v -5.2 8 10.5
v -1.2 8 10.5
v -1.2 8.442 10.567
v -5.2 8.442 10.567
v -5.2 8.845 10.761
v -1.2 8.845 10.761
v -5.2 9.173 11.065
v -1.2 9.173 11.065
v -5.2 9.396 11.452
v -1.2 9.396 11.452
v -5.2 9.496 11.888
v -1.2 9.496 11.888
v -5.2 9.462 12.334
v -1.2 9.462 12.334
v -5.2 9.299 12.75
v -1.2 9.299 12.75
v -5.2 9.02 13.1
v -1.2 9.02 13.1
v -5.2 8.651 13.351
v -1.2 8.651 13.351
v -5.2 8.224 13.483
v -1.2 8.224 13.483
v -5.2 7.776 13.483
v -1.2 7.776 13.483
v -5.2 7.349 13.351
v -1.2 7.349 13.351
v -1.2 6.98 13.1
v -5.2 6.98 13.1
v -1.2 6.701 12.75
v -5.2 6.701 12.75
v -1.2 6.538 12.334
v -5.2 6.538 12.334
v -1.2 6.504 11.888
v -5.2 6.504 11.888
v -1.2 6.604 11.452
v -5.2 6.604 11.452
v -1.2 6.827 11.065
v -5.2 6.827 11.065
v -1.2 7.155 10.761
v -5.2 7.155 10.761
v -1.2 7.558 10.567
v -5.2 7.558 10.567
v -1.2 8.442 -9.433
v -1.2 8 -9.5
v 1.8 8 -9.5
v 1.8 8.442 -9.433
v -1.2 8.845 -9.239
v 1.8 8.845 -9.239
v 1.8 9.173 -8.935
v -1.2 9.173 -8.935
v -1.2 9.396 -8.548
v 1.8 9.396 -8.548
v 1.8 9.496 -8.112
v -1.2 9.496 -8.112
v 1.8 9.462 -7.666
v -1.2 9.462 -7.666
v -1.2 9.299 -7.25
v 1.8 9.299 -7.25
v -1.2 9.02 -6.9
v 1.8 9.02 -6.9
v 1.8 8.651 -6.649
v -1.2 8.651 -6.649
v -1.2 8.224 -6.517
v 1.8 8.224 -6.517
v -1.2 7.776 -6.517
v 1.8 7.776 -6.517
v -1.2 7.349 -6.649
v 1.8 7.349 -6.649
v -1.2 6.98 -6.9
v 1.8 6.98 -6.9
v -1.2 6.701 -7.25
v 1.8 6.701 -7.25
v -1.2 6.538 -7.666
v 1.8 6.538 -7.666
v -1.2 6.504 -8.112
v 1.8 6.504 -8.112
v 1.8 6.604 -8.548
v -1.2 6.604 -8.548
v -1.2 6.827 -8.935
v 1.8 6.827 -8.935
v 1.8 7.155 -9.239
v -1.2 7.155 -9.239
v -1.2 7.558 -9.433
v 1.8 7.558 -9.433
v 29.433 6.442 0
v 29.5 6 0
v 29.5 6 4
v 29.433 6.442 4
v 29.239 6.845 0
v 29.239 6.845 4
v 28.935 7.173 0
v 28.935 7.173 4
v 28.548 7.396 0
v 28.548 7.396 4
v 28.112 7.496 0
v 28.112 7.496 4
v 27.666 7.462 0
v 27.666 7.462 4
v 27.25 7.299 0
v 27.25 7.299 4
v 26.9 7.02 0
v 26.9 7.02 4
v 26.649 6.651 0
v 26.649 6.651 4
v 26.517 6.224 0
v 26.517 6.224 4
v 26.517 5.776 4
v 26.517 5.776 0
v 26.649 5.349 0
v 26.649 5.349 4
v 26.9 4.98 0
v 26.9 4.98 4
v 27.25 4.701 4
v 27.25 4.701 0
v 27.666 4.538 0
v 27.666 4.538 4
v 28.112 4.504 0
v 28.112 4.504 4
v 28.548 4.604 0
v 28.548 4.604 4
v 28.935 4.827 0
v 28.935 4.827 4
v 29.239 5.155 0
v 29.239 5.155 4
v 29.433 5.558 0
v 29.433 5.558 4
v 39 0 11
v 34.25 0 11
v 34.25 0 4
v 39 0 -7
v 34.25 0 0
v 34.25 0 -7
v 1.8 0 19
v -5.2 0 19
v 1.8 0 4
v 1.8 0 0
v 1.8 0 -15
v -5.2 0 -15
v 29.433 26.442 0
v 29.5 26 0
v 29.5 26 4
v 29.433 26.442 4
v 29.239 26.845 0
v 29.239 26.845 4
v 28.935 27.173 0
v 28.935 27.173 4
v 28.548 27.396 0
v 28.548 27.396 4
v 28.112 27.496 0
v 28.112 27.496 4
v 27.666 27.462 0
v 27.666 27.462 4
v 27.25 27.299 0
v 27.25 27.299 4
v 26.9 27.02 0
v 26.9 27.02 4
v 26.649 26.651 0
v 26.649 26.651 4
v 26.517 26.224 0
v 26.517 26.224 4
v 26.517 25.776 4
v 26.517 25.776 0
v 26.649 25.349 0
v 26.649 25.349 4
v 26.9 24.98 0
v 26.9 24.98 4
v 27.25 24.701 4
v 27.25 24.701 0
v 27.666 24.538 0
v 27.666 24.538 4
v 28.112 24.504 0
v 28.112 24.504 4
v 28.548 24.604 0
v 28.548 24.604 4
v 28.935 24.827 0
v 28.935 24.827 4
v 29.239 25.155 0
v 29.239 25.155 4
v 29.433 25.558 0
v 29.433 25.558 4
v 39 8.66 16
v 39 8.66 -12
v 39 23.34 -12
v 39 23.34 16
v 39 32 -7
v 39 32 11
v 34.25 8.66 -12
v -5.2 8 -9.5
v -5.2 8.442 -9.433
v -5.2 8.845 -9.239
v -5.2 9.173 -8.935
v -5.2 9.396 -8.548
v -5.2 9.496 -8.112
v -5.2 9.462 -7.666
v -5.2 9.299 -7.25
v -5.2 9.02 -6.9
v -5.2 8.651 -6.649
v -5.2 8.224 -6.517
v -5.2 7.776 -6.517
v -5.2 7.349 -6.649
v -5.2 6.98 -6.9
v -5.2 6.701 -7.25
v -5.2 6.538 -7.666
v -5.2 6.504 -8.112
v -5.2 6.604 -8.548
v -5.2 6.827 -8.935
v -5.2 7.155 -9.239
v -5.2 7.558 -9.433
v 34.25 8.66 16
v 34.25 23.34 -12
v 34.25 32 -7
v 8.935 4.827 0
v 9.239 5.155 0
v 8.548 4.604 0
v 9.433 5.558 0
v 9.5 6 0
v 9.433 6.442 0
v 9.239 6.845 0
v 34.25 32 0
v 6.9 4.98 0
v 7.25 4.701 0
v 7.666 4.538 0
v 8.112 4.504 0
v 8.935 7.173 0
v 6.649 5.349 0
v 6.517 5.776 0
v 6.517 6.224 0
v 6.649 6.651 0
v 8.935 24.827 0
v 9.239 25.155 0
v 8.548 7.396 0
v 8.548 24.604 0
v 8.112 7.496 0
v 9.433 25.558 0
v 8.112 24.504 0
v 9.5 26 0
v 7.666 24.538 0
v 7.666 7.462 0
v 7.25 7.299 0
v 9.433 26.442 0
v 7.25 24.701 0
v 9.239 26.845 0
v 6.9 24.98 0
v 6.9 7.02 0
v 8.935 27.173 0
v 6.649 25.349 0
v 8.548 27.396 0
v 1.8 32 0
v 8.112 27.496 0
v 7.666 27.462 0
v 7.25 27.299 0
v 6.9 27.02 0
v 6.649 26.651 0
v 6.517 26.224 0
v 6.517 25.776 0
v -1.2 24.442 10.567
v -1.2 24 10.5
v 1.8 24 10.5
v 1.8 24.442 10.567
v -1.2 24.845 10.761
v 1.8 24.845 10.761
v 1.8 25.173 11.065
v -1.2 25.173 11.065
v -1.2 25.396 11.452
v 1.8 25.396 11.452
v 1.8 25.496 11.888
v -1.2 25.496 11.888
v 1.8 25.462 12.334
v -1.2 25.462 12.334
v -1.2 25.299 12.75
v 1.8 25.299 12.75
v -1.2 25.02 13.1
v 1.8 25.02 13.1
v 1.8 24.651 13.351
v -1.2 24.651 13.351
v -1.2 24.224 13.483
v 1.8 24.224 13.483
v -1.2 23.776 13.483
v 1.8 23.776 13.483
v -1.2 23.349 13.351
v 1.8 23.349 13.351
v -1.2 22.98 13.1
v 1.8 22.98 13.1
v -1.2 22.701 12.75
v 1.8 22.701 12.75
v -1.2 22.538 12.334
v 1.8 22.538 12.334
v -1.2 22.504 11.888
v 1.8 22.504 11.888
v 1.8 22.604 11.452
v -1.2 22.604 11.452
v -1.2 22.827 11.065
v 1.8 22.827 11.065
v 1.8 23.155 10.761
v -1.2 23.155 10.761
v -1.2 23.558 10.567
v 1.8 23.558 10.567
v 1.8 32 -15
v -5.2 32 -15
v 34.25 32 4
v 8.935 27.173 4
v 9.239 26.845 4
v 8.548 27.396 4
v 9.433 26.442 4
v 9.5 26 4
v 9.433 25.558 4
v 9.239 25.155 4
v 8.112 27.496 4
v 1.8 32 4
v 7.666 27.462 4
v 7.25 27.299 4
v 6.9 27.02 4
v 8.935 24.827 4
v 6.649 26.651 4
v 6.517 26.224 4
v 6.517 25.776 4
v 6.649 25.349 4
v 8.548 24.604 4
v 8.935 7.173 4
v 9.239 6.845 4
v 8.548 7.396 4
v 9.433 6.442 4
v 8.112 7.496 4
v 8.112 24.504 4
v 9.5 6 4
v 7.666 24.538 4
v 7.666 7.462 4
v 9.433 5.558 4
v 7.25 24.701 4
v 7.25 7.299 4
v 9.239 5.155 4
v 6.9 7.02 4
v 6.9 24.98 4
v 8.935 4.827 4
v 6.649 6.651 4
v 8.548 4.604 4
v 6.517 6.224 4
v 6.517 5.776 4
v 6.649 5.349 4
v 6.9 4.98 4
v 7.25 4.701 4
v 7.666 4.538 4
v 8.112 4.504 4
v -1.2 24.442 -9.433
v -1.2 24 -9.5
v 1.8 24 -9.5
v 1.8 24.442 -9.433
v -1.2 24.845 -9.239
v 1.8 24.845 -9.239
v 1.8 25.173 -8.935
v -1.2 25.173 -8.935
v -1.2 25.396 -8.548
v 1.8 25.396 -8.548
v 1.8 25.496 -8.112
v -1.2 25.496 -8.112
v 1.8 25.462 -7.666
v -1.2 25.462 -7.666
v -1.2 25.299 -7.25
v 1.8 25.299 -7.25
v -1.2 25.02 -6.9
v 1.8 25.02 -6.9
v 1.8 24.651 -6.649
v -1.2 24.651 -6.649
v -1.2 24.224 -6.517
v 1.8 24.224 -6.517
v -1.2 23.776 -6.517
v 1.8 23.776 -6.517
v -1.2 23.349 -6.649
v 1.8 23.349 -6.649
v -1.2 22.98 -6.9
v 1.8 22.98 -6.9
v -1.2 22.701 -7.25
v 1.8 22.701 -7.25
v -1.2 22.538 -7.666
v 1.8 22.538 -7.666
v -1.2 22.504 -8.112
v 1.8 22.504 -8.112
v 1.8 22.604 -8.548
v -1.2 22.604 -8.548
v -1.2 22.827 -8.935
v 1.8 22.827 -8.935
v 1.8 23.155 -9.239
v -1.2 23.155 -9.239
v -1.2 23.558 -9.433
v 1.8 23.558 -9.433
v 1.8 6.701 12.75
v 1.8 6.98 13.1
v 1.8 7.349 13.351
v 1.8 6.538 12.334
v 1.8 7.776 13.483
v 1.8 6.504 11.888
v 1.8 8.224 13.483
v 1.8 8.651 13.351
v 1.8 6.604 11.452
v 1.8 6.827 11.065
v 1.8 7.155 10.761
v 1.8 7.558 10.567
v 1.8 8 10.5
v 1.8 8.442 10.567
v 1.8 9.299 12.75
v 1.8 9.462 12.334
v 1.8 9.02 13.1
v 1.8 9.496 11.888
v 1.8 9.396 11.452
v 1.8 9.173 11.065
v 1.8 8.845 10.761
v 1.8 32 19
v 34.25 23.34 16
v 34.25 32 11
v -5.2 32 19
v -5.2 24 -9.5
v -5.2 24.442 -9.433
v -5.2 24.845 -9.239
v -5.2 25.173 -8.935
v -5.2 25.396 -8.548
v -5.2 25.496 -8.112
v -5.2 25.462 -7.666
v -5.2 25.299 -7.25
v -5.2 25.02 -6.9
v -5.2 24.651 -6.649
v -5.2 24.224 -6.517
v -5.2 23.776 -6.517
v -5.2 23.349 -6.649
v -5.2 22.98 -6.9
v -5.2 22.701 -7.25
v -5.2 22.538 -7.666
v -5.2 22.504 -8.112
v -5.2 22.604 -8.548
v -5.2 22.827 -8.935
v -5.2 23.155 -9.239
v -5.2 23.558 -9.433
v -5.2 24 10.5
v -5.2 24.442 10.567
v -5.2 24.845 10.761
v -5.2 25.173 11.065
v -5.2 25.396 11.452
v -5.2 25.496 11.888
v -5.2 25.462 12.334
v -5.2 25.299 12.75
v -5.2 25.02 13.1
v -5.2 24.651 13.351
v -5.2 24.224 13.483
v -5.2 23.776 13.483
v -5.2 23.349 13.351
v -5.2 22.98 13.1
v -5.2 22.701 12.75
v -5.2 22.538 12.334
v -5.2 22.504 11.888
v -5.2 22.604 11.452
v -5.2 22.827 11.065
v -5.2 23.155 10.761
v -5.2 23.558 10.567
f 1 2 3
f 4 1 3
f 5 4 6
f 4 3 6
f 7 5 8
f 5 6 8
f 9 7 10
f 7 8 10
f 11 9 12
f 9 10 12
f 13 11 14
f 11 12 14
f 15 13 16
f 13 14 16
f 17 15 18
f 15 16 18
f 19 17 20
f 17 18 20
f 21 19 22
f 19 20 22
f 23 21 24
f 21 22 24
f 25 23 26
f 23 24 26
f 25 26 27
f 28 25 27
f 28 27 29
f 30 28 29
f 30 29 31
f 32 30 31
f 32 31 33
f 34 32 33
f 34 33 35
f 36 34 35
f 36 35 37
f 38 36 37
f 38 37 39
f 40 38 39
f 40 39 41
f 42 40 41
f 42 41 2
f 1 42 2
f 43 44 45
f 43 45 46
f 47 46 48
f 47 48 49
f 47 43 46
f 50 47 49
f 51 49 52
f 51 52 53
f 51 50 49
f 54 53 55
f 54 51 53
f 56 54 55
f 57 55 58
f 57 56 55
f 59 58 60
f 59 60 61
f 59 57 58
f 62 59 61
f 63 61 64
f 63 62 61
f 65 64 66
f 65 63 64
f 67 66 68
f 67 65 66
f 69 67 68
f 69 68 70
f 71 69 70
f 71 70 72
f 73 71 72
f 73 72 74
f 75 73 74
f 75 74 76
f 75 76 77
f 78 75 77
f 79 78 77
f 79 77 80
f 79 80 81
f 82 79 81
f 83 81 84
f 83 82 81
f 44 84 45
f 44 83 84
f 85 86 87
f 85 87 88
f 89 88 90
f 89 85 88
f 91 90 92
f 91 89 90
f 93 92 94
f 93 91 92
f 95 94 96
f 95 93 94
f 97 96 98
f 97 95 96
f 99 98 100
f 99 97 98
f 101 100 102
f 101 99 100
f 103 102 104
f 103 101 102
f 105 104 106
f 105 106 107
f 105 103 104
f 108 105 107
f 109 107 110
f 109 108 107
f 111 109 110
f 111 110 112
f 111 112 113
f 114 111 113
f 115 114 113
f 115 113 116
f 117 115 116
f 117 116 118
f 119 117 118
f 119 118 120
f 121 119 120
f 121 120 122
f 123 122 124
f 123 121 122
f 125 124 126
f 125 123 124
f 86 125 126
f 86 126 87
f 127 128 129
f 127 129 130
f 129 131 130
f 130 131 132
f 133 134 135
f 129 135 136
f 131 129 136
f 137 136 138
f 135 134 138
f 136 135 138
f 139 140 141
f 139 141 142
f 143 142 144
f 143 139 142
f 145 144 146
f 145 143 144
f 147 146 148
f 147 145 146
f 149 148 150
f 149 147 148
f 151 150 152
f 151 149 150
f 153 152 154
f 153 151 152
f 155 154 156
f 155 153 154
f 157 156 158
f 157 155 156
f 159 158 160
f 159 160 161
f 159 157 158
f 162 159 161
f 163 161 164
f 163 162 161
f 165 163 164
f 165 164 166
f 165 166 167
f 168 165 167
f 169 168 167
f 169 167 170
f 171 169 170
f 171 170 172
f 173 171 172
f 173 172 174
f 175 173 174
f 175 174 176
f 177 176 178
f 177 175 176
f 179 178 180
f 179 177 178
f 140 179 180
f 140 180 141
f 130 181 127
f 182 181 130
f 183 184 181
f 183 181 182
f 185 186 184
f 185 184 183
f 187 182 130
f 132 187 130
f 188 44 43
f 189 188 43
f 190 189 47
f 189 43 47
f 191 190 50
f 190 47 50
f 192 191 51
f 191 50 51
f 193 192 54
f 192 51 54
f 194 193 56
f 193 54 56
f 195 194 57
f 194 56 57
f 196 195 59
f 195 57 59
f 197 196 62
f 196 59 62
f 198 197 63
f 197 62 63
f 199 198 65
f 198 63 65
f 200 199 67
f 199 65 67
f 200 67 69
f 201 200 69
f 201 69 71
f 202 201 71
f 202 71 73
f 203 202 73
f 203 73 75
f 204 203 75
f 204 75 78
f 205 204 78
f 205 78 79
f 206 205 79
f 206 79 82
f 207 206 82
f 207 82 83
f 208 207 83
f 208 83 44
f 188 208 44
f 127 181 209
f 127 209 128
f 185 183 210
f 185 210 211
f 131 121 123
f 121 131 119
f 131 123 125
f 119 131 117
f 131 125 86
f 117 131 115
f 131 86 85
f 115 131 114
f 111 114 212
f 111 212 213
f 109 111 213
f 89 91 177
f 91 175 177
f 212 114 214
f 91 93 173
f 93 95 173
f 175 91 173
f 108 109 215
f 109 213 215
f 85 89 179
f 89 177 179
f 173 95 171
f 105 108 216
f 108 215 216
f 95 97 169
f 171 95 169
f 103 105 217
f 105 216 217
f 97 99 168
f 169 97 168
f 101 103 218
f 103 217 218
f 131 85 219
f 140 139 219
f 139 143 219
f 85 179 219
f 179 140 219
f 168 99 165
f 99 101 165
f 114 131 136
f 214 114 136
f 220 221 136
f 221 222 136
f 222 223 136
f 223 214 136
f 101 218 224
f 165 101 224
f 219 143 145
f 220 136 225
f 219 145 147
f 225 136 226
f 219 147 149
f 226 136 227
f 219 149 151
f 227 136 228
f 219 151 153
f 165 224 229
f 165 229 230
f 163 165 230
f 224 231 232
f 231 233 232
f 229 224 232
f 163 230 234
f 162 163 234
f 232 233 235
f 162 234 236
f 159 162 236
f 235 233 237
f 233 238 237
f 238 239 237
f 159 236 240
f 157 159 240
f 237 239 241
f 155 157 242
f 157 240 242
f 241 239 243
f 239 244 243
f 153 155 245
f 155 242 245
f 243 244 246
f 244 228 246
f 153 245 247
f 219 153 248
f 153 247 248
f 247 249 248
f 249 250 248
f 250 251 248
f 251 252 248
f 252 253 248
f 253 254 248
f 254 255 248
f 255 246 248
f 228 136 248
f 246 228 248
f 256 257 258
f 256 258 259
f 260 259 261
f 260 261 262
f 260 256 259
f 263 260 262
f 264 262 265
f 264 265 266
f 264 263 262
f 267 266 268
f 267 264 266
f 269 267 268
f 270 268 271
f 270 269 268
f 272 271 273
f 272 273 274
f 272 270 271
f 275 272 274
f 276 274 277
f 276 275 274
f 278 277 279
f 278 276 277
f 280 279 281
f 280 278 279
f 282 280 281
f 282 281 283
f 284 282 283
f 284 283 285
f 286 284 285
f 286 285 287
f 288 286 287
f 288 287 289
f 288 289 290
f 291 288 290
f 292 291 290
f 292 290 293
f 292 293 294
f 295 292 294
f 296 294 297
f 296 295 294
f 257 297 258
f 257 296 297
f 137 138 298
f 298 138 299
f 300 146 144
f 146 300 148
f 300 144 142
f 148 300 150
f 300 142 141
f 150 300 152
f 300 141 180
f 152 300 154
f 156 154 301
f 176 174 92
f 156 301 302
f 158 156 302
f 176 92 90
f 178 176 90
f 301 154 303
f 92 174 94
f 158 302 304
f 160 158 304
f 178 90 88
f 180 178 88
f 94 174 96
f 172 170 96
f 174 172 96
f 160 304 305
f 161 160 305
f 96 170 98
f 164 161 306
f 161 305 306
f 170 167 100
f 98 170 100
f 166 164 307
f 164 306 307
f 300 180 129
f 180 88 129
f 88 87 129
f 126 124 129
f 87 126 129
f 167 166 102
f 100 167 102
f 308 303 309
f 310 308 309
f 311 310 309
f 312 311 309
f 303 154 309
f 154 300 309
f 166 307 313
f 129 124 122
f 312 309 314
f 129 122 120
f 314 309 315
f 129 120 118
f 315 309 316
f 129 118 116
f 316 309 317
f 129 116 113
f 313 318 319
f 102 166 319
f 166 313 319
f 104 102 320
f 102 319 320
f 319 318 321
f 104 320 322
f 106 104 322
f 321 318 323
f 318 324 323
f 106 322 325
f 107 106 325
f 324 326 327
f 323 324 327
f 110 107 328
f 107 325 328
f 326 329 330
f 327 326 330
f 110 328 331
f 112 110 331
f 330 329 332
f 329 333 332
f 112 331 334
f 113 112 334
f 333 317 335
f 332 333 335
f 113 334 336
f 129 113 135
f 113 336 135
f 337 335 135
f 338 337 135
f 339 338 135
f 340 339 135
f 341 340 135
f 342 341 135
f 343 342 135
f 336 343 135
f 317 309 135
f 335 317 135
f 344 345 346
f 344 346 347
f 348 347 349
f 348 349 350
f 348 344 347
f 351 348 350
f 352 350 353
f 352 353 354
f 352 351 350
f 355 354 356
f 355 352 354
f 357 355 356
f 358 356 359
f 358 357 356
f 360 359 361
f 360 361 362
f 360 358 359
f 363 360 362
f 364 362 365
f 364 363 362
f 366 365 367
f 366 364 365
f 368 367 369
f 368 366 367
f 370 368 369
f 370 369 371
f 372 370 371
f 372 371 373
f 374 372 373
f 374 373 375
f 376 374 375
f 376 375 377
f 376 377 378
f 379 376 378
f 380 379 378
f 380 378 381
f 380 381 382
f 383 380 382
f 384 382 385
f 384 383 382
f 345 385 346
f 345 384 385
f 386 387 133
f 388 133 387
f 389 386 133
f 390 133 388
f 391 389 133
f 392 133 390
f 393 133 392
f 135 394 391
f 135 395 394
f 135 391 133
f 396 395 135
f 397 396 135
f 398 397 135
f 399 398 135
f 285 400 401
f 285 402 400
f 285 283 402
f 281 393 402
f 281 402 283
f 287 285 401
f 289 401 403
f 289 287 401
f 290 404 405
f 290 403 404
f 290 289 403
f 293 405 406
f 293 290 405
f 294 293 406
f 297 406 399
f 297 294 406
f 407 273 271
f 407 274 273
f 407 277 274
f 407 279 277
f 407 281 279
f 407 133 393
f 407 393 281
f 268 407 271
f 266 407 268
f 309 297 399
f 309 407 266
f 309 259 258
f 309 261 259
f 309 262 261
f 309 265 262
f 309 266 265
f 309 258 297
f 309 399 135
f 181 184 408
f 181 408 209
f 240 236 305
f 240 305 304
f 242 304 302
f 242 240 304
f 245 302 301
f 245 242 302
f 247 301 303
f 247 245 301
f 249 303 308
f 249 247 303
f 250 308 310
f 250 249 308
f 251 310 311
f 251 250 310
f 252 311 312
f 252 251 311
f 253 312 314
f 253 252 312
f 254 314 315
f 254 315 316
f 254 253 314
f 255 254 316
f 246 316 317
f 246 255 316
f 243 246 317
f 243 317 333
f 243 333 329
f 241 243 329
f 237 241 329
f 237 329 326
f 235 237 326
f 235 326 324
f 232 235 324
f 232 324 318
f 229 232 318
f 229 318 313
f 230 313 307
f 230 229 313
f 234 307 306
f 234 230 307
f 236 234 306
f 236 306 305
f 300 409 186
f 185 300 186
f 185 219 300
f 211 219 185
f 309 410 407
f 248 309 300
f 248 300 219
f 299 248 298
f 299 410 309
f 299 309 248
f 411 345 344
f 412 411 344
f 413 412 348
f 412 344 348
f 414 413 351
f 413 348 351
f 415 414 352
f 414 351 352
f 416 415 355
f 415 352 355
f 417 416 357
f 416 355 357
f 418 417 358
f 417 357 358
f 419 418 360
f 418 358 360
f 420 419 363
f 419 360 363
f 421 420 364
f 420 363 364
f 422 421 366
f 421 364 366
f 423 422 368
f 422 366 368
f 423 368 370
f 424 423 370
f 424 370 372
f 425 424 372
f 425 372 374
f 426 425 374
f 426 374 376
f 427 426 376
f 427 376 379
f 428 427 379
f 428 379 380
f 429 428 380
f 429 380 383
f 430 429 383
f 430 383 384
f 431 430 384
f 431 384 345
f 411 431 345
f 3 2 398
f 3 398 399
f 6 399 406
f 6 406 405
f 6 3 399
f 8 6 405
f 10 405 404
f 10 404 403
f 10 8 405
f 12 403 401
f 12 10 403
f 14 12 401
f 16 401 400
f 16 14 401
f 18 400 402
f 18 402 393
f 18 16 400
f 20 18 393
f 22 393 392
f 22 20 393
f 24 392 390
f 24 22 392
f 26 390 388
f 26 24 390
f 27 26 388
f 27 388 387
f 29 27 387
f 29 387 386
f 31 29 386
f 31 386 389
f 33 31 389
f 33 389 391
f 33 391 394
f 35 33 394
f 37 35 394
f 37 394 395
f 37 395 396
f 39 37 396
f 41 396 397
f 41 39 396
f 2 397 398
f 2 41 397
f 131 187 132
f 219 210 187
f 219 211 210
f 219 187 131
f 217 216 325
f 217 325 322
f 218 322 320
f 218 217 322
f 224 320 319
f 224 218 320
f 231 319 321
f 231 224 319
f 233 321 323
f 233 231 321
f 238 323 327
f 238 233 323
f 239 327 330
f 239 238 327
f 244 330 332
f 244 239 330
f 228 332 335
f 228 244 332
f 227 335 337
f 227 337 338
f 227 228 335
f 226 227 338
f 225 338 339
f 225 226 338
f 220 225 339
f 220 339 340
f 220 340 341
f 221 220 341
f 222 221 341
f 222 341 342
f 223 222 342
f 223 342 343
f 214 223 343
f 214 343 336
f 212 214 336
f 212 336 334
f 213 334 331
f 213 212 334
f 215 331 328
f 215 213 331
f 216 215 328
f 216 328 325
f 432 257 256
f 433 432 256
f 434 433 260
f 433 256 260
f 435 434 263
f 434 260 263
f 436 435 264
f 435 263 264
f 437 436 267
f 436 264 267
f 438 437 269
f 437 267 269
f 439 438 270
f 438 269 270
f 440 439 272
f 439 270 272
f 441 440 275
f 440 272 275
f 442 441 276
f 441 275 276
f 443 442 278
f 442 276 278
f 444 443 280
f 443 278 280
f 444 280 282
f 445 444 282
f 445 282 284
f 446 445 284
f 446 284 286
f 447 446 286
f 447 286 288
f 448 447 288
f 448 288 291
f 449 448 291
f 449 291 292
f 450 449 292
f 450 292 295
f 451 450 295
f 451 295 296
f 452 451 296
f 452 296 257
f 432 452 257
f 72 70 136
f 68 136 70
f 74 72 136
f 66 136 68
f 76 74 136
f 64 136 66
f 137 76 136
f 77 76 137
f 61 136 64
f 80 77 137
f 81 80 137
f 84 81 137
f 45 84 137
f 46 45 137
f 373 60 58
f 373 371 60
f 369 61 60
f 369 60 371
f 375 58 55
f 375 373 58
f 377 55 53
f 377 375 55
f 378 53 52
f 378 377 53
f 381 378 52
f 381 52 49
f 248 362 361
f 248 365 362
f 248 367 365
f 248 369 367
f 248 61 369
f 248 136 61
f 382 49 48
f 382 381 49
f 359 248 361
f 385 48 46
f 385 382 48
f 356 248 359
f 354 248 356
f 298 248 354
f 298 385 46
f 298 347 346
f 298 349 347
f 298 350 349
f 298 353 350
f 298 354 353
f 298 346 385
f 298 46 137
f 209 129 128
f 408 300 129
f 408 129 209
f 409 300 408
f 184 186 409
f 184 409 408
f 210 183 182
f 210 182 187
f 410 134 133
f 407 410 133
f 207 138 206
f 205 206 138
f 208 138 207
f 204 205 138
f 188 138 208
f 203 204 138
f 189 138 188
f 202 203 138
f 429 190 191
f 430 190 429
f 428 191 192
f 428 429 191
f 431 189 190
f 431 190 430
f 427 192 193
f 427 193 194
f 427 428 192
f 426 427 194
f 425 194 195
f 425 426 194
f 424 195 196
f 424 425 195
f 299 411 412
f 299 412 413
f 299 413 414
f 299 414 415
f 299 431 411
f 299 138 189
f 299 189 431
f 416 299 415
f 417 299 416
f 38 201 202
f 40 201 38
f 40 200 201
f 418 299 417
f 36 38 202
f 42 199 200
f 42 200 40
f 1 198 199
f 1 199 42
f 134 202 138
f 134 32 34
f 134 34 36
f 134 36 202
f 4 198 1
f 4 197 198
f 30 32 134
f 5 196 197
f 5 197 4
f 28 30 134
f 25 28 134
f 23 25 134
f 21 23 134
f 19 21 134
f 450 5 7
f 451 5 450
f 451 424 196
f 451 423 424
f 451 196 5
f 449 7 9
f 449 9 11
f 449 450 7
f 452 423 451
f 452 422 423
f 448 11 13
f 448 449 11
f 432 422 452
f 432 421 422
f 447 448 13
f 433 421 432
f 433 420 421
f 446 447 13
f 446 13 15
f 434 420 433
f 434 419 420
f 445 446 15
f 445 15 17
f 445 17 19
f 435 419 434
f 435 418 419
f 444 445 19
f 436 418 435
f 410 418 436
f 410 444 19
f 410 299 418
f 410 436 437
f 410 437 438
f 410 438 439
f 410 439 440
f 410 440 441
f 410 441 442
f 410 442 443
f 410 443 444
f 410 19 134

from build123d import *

# Parameters (mm, degrees)
SKETCH_1_W          = 36
SKETCH_1_H          = 32
SKETCH_1_R          = 1.5
EXTRUDE_1_DEPTH     = 4
EXTRUDE_2_DEPTH     = 32
SKETCH_8_R          = 1.5
CUT_EXTRUDE_1_DEPTH = 5
SKETCH1_W           = 4
SKETCH1_H           = 32
BOSS_EXTRUDE1_DEPTH = 3
SKETCH2_W           = 5
SKETCH2_H           = 32
BOSS_EXTRUDE2_DEPTH = 12
CUT_EXTRUDE1_DEPTH  = 5
BOSS_EXTRUDE5_DEPTH = 5
SKETCH7_W           = 15
SKETCH7_H           = 32
SKETCH7_R           = 1.5
BOSS_EXTRUDE6_DEPTH = 3
CUT_EXTRUDE2_DEPTH  = 0.25


with BuildPart() as part:
    # Эскиз1 → Бобышка-Вытянуть1 (new body)
    with BuildSketch(Plane.XY):
        with Locations((18, 16)):
            Rectangle(SKETCH_1_W, SKETCH_1_H)
        with Locations((8, 26)):
            Circle(SKETCH_1_R, mode=Mode.SUBTRACT)
        with Locations((28, 26)):
            Circle(SKETCH_1_R, mode=Mode.SUBTRACT)
        with Locations((8, 6)):
            Circle(SKETCH_1_R, mode=Mode.SUBTRACT)
        with Locations((28, 6)):
            Circle(SKETCH_1_R, mode=Mode.SUBTRACT)
    extrude(amount=EXTRUDE_1_DEPTH)

    # Эскиз7 → Бобышка-Вытянуть2 (add)
    with BuildSketch(Plane(origin=(0, 32, 0), x_dir=(1, 0, 0), z_dir=(0, 1, 0))):
        Polygon((0, 0), (-1.2, 0), (-1.2, 15), (-5.2, 15), (-5.2, -19), (-1.2, -19), (-1.2, -4), (0, -4), align=None)
    extrude(amount=-EXTRUDE_2_DEPTH)

    # Эскиз8 → Вырез-Вытянуть1 (cut, through all)
    with BuildSketch(Plane(origin=(-1.2, 0, 0), x_dir=(0, 0, -1), z_dir=(1, 0, 0))):
        with Locations((8, 24)):
            Circle(SKETCH_8_R)
        with Locations((8, 8)):
            Circle(SKETCH_8_R)
        with Locations((-12, 8)):
            Circle(SKETCH_8_R)
        with Locations((-12, 24)):
            Circle(SKETCH_8_R)
    extrude(amount=-CUT_EXTRUDE_1_DEPTH, mode=Mode.SUBTRACT)

    # Sketch1 → Boss-Extrude1 (add)
    with BuildSketch(Plane(origin=(36, 0, 0), x_dir=(0, 0, -1), z_dir=(1, 0, 0))):
        with Locations((-2, 16)):
            Rectangle(SKETCH1_W, SKETCH1_H)
    extrude(amount=BOSS_EXTRUDE1_DEPTH)

    # Sketch2 → Boss-Extrude2 (add)
    with BuildSketch(Plane(origin=(0, 0, 0), x_dir=(-1, 0, 0), z_dir=(0, 0, -1))):
        with Locations((-36.5, 16)):
            Rectangle(SKETCH2_W, SKETCH2_H)
    extrude(amount=BOSS_EXTRUDE2_DEPTH)

    # Sketch3 → Cut-Extrude1 (cut)
    with BuildSketch(Plane(origin=(39, 0, 0), x_dir=(0, 0, -1), z_dir=(1, 0, 0))):
        Polygon((7, 32), (12, 32), (12, 23.339745962), align=None)
        Polygon((12, 8.660254038), (7, 0), (12, 0), align=None)
    extrude(amount=-CUT_EXTRUDE1_DEPTH, mode=Mode.SUBTRACT)

    # Sketch6 → Boss-Extrude5 (add)
    with BuildSketch(Plane(origin=(39, 0, 0), x_dir=(0, 0, -1), z_dir=(1, 0, 0))):
        Polygon((-16, 8.660254038), (-11, 0), (-4, 0), (-4, 32), (-11, 32), (-16, 23.339745962), align=None)
    extrude(amount=-BOSS_EXTRUDE5_DEPTH)

    # Sketch7 → Boss-Extrude6 (add)
    with BuildSketch(Plane(origin=(-1.2, 0, 0), x_dir=(0, 0, -1), z_dir=(1, 0, 0))):
        with Locations((7.5, 16)):
            Rectangle(SKETCH7_W, SKETCH7_H)
        with Locations((8, 24)):
            Circle(SKETCH7_R, mode=Mode.SUBTRACT)
        with Locations((8, 8)):
            Circle(SKETCH7_R, mode=Mode.SUBTRACT)
        with Locations((-11.5, 16)):
            Rectangle(SKETCH7_W, SKETCH7_H)
        with Locations((-12, 24)):
            Circle(SKETCH7_R, mode=Mode.SUBTRACT)
        with Locations((-12, 8)):
            Circle(SKETCH7_R, mode=Mode.SUBTRACT)
    extrude(amount=BOSS_EXTRUDE6_DEPTH)

    # Sketch8 → Cut-Extrude2 (cut)
    with BuildSketch(Plane.ZY.offset(-34)):
        Polygon((-12, 23.339745962), (-12, 8.660254038), (-7, 0), (0, 0), (0, 32), (-7, 32), align=None)
        Polygon((4, 32), (4, 0), (11, 0), (16, 8.660254038), (16, 23.339745962), (11, 32), align=None)
    extrude(amount=-CUT_EXTRUDE2_DEPTH, mode=Mode.SUBTRACT)


solid = part.part
